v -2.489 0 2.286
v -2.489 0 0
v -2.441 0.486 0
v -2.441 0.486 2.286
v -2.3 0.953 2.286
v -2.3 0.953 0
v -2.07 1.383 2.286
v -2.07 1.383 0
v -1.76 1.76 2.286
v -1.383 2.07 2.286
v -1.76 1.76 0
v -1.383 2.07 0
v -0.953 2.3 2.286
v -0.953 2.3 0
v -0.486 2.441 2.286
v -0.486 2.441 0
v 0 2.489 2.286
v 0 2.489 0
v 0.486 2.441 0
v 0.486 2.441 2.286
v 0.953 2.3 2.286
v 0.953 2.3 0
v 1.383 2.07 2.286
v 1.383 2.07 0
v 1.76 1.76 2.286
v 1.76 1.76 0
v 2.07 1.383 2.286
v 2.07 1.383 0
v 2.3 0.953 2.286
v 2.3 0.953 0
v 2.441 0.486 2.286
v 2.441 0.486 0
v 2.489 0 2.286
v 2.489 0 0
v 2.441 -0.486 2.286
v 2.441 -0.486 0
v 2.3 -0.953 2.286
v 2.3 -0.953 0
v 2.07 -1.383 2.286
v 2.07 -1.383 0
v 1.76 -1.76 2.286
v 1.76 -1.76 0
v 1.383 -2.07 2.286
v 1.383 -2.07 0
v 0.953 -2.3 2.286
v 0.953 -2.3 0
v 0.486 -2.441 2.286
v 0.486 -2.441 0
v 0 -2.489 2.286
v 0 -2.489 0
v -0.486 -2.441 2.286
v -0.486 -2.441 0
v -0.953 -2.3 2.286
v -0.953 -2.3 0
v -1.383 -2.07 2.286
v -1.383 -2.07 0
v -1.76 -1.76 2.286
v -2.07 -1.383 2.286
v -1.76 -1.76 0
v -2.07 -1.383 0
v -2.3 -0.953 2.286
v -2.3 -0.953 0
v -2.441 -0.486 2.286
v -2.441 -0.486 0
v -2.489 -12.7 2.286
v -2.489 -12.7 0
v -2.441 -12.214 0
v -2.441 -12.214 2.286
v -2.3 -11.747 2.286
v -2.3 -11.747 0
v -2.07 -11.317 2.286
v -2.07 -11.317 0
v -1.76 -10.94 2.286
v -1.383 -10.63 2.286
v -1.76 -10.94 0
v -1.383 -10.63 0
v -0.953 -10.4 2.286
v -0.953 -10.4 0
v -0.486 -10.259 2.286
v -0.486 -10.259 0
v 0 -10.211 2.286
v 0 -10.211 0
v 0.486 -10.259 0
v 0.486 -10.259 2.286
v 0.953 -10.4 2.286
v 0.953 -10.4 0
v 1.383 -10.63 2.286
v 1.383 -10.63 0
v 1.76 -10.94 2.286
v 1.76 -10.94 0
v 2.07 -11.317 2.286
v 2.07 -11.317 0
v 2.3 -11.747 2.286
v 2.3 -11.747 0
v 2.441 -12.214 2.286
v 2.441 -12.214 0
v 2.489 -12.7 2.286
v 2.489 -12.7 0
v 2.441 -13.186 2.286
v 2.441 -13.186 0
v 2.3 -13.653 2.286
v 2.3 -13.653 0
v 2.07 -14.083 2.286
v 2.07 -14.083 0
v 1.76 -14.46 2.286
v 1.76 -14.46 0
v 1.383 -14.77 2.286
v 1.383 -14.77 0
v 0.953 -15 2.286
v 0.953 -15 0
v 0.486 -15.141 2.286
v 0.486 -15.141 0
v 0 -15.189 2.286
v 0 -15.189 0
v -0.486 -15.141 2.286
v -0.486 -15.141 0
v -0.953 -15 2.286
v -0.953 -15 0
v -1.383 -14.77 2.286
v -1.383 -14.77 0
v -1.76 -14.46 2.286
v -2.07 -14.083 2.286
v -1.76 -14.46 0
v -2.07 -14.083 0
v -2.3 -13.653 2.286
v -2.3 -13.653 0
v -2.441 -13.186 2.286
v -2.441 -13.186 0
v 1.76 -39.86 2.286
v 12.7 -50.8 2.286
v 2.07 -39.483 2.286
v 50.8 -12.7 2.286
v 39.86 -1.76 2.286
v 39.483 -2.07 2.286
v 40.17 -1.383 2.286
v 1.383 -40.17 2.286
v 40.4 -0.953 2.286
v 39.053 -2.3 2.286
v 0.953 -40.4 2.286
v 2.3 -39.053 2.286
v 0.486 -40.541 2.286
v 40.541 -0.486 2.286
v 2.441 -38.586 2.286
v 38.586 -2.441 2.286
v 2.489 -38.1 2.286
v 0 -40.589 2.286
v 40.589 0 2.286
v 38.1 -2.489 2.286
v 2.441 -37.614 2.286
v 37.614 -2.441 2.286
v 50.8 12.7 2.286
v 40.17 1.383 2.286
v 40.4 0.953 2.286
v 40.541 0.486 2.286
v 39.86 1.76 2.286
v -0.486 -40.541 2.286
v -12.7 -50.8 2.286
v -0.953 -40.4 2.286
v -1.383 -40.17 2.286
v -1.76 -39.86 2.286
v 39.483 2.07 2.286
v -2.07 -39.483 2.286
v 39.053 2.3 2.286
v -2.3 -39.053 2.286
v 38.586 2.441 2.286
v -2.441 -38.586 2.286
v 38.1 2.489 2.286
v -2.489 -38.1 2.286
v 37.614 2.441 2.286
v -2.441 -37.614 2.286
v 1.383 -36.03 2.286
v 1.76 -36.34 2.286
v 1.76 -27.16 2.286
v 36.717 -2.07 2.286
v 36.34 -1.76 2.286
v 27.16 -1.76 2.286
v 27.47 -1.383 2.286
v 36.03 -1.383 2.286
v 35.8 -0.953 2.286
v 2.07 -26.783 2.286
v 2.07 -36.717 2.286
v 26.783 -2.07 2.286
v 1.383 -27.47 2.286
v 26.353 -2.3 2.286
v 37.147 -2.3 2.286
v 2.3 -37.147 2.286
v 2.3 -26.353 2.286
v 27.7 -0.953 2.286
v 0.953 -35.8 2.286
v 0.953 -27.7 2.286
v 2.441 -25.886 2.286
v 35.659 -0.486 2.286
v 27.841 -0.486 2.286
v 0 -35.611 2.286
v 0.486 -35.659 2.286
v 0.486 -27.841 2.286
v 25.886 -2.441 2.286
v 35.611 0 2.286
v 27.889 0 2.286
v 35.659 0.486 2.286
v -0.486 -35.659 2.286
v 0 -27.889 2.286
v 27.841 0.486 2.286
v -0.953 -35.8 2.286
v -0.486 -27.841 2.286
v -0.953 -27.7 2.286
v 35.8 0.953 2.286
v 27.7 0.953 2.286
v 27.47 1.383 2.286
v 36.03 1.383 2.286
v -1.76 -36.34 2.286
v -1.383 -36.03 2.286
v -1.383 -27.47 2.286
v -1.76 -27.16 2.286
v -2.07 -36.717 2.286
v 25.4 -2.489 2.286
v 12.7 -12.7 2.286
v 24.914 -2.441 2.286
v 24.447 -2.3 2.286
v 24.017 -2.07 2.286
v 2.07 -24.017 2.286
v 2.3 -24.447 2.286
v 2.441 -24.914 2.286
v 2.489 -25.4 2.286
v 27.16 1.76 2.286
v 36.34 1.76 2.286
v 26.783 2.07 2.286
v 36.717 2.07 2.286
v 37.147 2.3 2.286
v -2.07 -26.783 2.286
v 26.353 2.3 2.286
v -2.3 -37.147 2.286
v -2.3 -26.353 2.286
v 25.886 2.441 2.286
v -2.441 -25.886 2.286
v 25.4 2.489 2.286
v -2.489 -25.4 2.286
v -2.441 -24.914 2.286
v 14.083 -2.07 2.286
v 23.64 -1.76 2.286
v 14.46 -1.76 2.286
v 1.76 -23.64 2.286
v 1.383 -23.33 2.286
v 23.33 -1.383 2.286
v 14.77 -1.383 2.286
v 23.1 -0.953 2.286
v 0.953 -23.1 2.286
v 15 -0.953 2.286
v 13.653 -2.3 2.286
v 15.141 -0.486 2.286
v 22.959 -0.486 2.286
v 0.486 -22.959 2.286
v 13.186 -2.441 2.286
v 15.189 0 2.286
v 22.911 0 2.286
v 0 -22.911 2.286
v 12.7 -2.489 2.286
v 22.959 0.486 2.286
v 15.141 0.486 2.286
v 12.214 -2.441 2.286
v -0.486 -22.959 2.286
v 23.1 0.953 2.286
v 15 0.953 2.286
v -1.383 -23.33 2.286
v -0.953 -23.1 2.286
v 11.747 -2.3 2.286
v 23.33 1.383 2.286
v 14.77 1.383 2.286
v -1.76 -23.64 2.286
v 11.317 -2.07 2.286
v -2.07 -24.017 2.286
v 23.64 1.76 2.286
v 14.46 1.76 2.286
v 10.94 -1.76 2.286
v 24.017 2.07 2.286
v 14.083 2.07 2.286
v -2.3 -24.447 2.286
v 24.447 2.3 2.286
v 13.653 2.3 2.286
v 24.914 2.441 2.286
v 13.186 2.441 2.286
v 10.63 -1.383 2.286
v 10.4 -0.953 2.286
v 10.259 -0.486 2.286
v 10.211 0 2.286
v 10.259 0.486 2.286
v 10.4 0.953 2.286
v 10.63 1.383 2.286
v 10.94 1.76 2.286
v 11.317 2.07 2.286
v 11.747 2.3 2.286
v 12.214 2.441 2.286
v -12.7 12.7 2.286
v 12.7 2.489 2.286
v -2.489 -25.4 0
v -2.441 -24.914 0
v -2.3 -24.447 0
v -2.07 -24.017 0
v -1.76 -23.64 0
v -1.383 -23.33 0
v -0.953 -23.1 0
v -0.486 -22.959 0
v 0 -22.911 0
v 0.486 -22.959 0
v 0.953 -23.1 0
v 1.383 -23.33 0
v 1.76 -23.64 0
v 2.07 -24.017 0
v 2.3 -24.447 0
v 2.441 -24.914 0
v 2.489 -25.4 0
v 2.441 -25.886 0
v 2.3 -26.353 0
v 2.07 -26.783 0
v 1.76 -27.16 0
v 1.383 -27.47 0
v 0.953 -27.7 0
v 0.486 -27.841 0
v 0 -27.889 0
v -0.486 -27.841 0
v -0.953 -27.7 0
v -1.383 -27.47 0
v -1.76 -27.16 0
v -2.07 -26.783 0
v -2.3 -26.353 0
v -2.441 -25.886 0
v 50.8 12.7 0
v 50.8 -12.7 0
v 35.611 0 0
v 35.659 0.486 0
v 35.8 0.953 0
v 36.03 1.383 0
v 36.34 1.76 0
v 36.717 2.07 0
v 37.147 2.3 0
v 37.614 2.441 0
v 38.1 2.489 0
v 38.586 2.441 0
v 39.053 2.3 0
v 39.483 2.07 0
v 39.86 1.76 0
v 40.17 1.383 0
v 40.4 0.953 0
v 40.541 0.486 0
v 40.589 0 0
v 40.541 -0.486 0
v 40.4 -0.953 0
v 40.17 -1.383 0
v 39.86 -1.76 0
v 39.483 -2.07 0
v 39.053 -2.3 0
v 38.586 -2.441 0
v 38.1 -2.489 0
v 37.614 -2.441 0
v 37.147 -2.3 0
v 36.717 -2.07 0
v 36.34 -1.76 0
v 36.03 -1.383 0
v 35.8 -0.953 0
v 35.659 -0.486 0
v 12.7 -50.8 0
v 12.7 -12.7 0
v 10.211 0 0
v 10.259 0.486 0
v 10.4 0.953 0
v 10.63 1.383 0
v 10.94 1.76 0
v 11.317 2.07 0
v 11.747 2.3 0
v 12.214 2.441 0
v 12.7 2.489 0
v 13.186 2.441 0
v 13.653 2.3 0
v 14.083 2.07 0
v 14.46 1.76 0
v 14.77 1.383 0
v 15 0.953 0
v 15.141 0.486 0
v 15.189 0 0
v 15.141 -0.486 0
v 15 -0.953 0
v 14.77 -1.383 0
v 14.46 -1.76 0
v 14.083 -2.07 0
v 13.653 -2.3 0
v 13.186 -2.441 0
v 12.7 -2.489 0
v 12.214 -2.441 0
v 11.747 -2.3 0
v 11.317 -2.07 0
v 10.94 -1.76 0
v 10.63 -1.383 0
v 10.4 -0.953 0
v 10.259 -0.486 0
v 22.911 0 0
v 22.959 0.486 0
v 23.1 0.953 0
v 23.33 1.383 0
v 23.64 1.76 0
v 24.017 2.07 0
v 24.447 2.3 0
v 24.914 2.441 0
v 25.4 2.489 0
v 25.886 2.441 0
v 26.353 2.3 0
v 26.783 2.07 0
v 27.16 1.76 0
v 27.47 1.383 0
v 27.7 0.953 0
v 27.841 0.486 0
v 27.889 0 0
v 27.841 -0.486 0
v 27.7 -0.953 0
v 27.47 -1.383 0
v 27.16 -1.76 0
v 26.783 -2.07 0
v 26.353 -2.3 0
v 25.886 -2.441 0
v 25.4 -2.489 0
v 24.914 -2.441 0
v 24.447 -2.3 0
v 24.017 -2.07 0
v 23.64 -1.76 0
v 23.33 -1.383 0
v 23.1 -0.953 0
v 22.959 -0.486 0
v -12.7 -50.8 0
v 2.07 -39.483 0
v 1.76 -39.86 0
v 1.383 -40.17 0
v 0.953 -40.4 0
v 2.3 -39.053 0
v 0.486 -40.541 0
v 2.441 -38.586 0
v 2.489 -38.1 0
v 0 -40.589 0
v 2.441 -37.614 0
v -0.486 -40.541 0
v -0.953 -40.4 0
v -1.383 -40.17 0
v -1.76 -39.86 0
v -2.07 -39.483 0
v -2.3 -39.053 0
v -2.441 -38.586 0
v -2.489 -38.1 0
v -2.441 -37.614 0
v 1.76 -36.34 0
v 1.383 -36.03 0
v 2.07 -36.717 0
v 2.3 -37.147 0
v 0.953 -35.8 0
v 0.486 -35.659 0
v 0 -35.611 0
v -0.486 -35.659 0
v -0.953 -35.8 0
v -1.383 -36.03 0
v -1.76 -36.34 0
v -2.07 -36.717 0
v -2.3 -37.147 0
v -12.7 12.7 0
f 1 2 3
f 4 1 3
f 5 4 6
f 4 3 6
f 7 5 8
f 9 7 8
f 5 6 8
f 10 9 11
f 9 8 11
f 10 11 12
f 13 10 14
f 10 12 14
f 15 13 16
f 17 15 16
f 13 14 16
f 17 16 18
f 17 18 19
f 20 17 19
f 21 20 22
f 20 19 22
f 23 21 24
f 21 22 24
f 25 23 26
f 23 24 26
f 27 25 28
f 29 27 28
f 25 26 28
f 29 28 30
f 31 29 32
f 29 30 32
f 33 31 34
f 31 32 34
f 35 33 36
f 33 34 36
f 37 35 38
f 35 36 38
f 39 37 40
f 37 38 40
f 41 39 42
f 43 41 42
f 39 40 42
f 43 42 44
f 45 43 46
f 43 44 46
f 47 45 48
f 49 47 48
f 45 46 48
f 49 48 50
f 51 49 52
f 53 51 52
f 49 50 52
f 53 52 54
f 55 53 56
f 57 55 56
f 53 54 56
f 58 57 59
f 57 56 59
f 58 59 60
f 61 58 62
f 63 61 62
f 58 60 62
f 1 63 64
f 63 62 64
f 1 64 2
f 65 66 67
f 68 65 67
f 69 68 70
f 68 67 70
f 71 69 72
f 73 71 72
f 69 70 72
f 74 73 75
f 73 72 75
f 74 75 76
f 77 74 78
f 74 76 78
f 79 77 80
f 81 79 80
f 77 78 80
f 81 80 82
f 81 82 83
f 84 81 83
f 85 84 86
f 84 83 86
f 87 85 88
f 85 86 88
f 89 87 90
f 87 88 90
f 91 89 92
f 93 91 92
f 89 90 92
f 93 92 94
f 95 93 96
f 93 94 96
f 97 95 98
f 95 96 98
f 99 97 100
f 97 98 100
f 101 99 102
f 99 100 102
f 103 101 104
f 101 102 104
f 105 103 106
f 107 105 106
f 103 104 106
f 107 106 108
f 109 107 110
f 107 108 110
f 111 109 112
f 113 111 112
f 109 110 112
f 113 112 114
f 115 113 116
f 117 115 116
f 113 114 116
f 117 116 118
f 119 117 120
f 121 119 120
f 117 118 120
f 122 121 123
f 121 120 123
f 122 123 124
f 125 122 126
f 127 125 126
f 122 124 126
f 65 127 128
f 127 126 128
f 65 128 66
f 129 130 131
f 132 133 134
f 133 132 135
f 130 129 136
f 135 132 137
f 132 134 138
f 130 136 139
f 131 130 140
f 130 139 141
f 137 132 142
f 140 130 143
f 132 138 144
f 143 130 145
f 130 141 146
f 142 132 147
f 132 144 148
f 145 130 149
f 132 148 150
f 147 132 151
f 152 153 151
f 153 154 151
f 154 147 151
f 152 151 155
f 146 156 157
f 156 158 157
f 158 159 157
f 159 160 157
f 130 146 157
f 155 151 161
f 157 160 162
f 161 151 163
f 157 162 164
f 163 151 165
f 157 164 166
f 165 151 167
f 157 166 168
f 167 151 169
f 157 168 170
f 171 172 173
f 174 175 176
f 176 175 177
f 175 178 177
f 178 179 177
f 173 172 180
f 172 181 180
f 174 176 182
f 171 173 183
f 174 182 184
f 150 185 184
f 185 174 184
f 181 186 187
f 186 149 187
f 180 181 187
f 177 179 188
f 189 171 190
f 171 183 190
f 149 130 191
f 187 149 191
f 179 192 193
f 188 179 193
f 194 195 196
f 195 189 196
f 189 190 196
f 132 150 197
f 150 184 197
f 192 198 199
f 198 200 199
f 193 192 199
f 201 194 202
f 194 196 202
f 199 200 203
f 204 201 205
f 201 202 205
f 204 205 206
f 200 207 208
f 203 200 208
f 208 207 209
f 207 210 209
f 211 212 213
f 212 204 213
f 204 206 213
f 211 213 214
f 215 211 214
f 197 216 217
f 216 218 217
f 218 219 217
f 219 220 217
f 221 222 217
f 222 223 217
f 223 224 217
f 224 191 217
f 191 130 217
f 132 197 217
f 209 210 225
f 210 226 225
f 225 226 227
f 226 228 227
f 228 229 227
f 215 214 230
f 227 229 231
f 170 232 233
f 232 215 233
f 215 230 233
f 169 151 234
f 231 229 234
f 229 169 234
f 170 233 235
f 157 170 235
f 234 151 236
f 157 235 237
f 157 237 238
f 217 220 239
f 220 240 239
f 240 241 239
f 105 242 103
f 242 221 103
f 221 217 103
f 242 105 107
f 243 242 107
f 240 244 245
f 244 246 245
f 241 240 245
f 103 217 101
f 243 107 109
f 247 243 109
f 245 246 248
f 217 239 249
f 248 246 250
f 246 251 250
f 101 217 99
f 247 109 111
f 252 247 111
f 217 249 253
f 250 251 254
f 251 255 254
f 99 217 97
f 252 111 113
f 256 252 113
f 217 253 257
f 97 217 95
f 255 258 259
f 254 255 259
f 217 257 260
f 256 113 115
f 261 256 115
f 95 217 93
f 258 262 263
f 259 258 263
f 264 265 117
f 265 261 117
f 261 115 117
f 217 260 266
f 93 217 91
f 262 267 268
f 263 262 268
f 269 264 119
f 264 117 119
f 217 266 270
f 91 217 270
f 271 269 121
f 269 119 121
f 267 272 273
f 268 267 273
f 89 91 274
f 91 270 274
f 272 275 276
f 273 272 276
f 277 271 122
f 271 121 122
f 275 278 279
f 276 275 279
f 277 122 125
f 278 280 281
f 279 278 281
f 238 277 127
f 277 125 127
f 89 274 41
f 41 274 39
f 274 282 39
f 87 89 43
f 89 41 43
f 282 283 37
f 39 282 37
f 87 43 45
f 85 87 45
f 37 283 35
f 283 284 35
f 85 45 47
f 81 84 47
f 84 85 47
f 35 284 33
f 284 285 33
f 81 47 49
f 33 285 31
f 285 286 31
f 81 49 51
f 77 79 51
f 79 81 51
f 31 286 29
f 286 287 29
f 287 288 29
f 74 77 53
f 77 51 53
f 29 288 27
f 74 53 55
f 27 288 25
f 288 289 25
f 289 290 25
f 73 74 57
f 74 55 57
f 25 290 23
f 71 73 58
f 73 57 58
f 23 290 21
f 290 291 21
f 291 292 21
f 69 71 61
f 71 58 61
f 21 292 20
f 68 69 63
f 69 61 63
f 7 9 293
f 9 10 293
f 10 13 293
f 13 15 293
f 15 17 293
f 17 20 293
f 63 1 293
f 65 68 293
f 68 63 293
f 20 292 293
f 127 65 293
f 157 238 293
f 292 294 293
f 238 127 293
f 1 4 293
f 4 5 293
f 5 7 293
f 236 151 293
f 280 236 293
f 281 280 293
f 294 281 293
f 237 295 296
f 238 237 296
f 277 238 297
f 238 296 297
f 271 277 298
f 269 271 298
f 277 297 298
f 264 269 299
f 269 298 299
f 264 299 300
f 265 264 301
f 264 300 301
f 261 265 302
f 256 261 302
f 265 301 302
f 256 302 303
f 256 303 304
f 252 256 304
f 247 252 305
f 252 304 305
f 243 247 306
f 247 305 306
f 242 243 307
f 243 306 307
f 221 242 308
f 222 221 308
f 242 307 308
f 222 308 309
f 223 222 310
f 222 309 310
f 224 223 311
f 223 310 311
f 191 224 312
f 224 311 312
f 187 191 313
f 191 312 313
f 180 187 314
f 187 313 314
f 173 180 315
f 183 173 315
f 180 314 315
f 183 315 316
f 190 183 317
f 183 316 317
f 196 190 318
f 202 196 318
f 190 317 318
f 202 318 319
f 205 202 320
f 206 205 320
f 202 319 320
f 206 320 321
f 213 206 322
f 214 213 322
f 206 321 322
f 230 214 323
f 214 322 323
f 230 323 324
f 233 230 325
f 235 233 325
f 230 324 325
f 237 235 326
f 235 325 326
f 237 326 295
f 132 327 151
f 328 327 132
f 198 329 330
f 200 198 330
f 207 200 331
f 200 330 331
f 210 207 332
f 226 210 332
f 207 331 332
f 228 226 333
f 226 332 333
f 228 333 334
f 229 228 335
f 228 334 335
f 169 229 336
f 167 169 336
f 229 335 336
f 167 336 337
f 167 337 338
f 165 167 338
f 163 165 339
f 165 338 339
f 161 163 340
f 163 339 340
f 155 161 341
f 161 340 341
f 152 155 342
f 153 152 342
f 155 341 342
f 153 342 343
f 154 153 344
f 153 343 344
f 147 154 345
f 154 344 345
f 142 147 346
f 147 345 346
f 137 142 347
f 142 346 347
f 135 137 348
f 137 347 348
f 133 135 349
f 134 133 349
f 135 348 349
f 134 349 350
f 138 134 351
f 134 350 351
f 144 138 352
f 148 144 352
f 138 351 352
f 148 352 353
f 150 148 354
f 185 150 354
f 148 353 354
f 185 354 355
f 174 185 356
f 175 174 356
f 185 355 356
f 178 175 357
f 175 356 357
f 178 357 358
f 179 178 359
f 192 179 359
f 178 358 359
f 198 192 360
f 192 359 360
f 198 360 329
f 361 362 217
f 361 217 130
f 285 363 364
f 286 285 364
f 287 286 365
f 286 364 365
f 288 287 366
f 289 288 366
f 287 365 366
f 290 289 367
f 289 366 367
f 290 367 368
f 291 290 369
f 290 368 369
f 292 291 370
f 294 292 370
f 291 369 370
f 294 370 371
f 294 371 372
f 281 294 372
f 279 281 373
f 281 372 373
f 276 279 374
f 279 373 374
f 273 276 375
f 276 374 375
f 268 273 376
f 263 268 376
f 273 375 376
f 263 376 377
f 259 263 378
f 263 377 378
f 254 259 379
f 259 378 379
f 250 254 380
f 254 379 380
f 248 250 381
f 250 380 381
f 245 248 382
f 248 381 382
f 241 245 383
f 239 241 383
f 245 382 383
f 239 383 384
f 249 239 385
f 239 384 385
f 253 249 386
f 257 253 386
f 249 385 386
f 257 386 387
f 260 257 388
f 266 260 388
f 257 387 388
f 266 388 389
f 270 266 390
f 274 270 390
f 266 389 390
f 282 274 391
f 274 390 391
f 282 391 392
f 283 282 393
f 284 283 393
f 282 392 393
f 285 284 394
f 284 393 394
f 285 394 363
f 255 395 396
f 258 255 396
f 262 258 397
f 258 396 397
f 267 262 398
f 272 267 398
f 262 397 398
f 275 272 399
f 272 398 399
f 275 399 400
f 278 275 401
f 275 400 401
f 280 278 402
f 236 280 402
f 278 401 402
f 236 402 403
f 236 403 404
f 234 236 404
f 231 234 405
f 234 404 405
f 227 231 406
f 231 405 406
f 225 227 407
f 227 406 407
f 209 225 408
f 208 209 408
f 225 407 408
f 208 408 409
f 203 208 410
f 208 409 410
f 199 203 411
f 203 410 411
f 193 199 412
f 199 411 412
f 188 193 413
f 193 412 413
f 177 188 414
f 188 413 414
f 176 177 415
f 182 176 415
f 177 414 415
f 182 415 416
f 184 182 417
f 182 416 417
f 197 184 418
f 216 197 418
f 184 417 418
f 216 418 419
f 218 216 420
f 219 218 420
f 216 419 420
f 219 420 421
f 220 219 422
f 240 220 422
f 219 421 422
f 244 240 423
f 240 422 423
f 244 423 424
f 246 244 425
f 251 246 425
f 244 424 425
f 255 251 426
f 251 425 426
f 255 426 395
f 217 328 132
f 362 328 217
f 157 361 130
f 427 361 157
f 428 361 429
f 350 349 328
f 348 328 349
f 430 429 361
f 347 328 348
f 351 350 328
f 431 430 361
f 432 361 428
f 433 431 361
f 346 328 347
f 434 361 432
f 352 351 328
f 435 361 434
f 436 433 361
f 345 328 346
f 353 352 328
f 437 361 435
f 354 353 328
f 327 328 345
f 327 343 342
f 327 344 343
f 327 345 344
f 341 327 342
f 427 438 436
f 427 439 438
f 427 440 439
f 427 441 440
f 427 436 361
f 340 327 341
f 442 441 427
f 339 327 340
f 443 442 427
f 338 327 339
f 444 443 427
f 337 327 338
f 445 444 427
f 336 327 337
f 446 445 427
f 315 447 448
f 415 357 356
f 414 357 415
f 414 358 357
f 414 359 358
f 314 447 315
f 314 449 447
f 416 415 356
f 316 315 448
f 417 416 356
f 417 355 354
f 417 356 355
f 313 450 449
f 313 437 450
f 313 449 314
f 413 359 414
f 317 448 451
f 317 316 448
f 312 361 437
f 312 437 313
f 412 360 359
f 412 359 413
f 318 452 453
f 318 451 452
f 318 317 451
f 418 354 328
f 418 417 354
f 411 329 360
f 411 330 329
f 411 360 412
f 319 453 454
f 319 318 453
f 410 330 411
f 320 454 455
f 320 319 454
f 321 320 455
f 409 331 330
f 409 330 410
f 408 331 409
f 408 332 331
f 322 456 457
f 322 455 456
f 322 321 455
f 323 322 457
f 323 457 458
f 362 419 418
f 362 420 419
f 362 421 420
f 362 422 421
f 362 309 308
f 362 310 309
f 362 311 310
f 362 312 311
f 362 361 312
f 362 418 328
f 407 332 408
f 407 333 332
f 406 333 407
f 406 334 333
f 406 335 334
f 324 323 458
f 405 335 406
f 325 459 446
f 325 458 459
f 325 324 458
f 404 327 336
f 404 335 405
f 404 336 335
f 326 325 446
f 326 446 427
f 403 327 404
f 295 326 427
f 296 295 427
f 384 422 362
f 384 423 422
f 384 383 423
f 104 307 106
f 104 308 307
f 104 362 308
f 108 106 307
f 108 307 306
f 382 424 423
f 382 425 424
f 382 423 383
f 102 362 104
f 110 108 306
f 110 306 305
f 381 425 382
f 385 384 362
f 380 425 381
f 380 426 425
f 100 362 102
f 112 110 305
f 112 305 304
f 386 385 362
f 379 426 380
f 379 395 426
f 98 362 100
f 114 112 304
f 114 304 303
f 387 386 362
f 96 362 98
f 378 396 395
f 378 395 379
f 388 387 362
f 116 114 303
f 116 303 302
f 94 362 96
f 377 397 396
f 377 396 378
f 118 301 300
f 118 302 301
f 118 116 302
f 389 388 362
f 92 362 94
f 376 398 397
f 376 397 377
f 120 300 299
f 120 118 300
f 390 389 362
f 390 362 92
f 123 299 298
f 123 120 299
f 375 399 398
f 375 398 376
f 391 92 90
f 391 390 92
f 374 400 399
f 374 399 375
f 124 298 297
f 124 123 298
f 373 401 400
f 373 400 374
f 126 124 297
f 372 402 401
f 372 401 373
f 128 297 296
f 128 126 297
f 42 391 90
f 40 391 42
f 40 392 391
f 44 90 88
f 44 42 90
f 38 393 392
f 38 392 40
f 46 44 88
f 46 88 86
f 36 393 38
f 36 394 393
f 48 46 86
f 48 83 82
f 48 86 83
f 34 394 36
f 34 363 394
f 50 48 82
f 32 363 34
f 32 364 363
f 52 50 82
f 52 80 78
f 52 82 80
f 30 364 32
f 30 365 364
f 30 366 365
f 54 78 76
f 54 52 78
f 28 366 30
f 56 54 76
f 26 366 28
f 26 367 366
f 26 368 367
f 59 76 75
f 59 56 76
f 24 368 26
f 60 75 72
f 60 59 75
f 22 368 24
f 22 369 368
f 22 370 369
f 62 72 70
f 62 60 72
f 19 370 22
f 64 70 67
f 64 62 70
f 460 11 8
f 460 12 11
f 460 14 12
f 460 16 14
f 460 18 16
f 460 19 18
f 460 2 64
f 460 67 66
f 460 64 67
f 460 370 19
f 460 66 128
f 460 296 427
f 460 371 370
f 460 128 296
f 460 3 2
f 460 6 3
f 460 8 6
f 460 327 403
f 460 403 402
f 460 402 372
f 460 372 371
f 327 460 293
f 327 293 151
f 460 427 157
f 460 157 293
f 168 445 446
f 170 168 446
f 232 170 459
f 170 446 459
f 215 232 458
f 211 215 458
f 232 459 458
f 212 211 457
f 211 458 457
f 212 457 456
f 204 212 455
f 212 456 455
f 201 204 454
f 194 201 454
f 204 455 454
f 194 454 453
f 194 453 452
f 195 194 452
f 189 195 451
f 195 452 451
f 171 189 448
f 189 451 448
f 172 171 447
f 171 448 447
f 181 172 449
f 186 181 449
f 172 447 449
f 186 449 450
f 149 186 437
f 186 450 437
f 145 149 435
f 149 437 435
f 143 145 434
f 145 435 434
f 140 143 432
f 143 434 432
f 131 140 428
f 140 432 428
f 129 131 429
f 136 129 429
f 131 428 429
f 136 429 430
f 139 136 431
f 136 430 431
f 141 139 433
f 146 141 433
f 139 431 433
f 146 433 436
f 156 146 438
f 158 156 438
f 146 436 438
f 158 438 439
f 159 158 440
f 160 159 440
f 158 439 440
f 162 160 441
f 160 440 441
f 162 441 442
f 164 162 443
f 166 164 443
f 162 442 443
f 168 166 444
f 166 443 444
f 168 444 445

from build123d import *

# Parameters (mm, degrees)
SKETCH1_R           = 2.4892
BOSS_EXTRUDE1_DEPTH = 2.286


with BuildPart() as part:
    # Sketch1 → Boss-Extrude1 (new body)
    with BuildSketch(Plane(origin=(0, 0, 0), x_dir=(-1, 0, 0), z_dir=(0, 0, -1))):
        Polygon((12.7, 12.7), (-50.8, 12.7), (-50.8, -12.7), (-12.7, -12.7), (-12.7, -50.8), (12.7, -50.8), align=None)
        with Locations((0, -25.4)):
            Circle(SKETCH1_R, mode=Mode.SUBTRACT)
        with Locations((-38.1, 0)):
            Circle(SKETCH1_R, mode=Mode.SUBTRACT)
        with Locations((-12.7, 0)):
            Circle(SKETCH1_R, mode=Mode.SUBTRACT)
        Circle(SKETCH1_R, mode=Mode.SUBTRACT)
        with Locations((-25.4, 0)):
            Circle(SKETCH1_R, mode=Mode.SUBTRACT)
        with Locations((0, -12.7)):
            Circle(SKETCH1_R, mode=Mode.SUBTRACT)
        with Locations((0, -38.1)):
            Circle(SKETCH1_R, mode=Mode.SUBTRACT)
    extrude(amount=-BOSS_EXTRUDE1_DEPTH)


solid = part.part
